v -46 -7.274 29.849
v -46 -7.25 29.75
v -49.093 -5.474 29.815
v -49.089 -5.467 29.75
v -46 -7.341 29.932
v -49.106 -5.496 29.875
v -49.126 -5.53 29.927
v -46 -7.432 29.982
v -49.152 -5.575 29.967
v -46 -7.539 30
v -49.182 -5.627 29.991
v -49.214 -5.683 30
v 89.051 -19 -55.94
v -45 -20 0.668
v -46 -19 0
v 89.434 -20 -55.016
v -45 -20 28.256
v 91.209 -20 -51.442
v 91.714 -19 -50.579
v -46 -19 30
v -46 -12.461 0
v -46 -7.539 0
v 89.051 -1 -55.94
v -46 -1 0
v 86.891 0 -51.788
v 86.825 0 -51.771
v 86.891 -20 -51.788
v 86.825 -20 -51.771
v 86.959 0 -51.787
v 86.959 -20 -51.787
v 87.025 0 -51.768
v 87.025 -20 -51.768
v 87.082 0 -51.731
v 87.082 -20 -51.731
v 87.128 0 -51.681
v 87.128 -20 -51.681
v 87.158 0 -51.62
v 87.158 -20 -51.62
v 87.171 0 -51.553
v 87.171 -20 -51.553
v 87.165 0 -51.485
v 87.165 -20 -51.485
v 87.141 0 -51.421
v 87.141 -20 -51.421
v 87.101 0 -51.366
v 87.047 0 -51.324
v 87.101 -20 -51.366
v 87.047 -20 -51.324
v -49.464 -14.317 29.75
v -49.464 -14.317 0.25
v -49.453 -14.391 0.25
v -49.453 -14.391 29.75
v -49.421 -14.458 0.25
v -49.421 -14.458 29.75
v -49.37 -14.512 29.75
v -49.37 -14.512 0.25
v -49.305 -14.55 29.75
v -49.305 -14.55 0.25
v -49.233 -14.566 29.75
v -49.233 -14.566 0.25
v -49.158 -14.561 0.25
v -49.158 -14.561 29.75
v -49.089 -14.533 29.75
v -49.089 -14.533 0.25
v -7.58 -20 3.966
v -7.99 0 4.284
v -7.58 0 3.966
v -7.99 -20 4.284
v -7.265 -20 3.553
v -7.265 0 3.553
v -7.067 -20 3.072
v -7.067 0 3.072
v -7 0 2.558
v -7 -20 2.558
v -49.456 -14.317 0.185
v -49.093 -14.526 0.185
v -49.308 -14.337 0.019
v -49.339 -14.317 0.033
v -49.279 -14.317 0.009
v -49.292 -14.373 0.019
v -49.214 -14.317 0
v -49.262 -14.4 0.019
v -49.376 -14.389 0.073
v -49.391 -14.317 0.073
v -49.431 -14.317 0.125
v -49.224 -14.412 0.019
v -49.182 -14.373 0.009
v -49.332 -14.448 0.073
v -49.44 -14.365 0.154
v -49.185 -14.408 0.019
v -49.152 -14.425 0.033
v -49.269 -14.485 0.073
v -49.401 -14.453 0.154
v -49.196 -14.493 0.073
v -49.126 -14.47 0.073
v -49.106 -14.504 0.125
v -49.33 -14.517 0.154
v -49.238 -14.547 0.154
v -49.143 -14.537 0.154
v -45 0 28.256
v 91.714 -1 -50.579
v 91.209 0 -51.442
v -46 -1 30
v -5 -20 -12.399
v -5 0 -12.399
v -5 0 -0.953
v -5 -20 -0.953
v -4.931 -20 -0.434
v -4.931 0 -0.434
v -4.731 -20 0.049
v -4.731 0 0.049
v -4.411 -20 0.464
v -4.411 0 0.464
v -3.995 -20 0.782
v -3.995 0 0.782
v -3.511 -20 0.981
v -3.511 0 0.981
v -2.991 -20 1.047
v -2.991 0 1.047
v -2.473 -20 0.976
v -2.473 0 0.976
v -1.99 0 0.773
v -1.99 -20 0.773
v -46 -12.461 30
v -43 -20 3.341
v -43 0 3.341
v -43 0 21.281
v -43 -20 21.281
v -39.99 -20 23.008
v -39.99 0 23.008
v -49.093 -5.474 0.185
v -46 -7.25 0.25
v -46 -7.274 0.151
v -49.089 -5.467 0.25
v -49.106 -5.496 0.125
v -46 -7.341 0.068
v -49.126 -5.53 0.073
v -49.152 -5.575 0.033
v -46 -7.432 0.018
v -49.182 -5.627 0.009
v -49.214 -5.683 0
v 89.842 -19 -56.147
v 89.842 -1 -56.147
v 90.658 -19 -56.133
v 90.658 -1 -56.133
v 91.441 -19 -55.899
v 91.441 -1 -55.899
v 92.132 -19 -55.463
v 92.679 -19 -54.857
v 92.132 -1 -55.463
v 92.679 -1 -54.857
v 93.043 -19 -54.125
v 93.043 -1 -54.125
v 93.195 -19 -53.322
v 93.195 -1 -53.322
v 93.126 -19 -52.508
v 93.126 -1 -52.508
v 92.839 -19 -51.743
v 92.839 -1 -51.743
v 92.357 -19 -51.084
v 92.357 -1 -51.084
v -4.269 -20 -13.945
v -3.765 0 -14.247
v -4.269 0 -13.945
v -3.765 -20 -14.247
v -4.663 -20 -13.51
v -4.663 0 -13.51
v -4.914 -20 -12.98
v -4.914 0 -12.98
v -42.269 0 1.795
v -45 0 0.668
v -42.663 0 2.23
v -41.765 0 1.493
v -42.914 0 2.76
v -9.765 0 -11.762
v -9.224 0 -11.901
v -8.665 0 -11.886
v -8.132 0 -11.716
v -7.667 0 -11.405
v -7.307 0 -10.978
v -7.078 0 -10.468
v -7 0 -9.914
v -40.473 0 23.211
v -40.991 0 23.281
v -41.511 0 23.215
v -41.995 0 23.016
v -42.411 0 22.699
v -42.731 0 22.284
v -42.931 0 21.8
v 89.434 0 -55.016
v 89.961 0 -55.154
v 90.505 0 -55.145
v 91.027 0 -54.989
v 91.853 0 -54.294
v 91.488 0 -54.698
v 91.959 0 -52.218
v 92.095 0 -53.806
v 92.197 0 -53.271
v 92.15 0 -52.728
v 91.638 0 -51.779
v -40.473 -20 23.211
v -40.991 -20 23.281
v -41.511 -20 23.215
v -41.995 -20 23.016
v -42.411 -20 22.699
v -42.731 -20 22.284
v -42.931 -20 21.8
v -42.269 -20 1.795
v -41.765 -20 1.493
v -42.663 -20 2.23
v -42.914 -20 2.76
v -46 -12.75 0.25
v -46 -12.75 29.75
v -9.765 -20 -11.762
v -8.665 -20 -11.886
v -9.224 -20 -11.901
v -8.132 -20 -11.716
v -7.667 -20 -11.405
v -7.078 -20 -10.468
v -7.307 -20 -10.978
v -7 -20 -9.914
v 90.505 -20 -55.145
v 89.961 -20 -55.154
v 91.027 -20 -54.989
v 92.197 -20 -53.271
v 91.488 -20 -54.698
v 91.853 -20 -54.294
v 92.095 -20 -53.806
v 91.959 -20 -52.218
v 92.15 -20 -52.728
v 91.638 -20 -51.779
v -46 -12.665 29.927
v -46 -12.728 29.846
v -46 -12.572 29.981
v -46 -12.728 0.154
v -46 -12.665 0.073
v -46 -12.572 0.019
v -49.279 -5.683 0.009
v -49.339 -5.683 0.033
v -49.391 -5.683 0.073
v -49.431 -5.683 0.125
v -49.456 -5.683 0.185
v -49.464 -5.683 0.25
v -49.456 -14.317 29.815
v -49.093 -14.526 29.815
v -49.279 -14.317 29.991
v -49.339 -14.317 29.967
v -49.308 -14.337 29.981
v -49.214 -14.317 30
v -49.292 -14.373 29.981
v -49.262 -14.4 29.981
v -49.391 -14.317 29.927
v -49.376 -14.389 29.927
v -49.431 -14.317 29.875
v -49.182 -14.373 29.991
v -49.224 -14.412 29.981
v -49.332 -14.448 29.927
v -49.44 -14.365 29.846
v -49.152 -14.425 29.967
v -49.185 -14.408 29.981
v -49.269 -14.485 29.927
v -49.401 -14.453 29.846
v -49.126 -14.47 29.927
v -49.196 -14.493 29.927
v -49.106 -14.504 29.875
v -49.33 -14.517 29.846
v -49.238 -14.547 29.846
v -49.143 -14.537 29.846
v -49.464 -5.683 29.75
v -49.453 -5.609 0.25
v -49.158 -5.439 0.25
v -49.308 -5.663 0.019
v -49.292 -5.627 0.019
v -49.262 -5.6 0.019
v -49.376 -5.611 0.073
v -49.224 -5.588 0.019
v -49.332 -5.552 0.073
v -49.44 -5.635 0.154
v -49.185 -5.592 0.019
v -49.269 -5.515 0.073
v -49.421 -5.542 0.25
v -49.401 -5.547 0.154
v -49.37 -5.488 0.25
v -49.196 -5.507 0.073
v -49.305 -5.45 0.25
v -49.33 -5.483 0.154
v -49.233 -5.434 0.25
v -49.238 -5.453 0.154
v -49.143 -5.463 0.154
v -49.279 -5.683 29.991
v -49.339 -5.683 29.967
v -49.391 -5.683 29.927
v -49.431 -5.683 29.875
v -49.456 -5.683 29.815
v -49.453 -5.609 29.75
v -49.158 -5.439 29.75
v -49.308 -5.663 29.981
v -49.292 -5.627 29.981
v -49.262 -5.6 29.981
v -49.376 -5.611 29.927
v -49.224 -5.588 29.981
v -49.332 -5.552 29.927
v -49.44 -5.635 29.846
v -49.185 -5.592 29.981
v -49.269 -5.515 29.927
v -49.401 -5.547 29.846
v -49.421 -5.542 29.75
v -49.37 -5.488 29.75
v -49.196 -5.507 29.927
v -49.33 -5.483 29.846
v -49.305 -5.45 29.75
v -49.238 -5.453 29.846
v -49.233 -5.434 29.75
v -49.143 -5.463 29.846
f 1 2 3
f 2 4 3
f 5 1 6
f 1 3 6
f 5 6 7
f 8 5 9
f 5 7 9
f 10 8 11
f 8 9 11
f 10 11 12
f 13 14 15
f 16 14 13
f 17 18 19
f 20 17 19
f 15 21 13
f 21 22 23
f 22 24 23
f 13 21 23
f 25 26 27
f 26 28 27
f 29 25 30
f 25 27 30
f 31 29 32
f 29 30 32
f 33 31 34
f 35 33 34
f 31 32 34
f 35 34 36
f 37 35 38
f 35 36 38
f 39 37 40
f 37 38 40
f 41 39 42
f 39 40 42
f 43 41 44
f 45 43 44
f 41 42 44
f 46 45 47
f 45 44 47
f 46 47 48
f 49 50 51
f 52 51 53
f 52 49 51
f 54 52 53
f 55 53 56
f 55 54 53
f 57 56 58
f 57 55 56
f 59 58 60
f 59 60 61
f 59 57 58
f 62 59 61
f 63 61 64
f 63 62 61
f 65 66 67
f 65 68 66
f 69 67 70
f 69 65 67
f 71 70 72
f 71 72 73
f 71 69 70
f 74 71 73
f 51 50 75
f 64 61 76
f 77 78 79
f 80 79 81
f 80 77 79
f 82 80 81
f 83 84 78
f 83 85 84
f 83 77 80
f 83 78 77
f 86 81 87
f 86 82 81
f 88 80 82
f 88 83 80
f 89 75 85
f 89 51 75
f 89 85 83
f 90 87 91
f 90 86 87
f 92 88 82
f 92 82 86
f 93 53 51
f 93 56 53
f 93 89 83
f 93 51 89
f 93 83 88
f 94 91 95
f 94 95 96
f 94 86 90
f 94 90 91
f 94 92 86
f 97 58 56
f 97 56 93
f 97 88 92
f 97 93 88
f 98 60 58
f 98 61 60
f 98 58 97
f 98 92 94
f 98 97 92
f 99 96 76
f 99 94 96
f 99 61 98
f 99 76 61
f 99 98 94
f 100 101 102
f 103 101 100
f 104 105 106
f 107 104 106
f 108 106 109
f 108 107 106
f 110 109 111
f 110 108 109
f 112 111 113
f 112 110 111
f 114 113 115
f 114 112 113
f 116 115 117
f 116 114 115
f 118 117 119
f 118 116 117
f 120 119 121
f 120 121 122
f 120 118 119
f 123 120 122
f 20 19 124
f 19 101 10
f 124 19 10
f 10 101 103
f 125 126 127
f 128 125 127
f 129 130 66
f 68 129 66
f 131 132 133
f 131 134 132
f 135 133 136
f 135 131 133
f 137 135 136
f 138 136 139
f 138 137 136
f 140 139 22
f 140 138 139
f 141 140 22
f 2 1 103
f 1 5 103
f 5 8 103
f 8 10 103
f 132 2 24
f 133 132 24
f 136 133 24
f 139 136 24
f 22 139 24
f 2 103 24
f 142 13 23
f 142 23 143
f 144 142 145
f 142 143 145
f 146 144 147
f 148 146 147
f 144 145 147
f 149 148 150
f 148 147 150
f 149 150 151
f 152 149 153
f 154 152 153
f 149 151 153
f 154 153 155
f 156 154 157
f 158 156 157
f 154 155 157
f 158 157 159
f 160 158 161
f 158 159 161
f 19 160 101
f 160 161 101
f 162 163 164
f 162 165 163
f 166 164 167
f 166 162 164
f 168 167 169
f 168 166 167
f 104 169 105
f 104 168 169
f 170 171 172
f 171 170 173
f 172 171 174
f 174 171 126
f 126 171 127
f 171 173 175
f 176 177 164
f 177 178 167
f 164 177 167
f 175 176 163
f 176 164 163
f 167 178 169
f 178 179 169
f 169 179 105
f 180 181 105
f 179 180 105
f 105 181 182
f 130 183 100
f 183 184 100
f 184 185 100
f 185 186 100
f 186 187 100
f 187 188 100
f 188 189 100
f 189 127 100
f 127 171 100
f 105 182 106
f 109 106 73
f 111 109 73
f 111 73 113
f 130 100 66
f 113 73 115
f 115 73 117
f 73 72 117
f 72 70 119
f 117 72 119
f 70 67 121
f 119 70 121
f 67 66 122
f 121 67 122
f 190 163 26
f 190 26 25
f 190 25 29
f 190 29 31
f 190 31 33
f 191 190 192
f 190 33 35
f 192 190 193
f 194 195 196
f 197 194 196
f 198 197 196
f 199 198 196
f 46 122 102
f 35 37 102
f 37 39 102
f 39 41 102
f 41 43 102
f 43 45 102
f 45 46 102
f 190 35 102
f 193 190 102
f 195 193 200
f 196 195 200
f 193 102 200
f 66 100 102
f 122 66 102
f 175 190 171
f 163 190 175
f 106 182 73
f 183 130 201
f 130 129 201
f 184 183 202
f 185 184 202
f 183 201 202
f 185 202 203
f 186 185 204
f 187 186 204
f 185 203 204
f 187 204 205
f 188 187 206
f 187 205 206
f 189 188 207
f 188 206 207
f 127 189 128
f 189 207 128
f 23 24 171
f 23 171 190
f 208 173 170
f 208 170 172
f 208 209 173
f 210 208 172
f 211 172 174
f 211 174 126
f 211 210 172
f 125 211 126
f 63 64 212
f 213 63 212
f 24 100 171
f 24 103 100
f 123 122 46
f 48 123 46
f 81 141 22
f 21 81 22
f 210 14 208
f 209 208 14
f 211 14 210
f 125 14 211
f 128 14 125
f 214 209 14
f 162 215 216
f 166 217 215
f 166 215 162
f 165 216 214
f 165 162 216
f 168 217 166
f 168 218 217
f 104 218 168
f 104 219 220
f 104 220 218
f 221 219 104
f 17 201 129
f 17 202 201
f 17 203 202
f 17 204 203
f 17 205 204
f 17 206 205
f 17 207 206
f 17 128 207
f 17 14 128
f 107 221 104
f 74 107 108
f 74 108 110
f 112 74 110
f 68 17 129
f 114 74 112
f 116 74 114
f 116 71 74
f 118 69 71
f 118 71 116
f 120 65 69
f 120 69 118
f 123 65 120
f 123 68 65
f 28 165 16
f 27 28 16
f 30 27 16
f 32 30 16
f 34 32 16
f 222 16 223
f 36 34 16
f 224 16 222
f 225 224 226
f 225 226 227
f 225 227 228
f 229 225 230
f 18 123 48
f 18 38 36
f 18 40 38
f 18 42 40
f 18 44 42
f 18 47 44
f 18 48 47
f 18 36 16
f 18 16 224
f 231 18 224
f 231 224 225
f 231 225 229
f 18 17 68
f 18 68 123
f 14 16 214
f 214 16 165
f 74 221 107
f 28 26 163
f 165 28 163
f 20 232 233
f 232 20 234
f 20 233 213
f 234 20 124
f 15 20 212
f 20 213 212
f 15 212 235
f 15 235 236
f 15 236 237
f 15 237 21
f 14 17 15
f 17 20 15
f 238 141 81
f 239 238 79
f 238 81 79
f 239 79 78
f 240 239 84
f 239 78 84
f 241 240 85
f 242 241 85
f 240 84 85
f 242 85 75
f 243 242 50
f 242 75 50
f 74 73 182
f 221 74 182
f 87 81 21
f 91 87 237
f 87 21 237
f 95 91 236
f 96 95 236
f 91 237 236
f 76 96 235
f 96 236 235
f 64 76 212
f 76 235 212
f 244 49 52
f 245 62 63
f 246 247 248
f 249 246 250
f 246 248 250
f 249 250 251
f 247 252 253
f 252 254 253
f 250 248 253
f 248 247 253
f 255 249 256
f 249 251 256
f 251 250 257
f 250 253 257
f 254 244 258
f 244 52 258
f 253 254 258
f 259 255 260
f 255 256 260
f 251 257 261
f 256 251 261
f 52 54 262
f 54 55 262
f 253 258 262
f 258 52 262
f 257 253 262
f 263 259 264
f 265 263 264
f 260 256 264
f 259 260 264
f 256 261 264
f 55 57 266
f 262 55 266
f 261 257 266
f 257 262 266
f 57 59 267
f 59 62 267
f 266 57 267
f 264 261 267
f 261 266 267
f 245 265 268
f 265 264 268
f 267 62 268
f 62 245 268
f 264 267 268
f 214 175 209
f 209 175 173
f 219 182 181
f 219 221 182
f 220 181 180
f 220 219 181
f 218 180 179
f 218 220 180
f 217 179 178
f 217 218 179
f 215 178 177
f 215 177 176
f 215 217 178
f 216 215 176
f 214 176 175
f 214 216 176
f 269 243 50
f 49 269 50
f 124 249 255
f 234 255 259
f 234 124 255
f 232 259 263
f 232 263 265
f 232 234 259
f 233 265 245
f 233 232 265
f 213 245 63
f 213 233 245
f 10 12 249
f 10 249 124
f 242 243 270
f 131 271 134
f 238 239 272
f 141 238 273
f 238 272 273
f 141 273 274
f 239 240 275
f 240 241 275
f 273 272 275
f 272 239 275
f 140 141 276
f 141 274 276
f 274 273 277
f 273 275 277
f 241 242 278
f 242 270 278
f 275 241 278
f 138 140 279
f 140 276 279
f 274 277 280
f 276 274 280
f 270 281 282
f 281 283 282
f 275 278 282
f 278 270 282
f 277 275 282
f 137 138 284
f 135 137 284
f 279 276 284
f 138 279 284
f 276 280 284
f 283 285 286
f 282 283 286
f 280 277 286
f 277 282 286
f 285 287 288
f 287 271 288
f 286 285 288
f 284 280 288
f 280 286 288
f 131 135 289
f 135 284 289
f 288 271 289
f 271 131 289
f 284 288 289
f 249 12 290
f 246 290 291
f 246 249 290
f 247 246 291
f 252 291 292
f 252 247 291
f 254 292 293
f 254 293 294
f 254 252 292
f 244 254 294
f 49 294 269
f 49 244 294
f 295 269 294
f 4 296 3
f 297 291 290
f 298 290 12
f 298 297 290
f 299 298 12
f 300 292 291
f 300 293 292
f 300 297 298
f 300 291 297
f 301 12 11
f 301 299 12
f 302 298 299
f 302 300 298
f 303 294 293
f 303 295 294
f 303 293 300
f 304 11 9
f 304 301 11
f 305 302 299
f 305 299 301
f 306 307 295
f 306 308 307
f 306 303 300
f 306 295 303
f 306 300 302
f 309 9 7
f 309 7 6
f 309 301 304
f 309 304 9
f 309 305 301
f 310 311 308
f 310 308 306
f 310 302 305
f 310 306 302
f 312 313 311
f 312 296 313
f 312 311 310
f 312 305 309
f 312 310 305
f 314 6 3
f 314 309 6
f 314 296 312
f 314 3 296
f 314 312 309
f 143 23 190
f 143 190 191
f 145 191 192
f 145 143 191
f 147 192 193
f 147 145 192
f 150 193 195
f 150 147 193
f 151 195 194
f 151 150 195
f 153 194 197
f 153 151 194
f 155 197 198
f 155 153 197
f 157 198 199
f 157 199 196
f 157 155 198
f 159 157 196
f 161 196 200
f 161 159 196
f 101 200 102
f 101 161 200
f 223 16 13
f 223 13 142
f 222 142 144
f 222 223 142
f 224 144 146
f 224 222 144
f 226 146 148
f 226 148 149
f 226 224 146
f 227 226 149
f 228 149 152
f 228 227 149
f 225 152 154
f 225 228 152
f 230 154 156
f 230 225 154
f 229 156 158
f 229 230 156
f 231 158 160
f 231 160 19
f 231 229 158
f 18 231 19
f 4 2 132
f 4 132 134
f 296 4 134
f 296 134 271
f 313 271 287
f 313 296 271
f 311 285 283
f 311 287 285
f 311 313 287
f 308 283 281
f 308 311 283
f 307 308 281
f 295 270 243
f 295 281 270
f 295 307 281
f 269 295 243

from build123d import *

# Parameters (mm, degrees)
F1_DEPTH = 20
F3_DEPTH = 30
F4_R     = 2
F5_SIZE  = 1
F6_R     = 0.25


with BuildPart() as f1:
    # F0 (on Front) → F1 (new body)
    with BuildSketch(Plane.XZ):
        with BuildLine():
            Line((-46, 30), (-46, 0))
            Line((-46, 0), (89.051266, -55.940066))
            ThreePointArc((89.051266, -55.940066), (92.886071, -54.503098), (91.714375, -50.579104))
            Line((91.714375, -50.579104), (-46, 30))
        make_face()
        Polygon((-5, 2.534367), (90.199316, -53.168427), (-5, -13.735579), (-7, -12.907152), (-43, 2.004536), (-43, 24.768836), (-7, 3.704603), align=None, mode=Mode.SUBTRACT)
        Polygon((-5, -13.735579), (-5, 2.534367), (-7, 3.704603), (-7, -12.907152), align=None)
    extrude(amount=F1_DEPTH)

    # F2 (on Top) → F3 (join)
    with BuildSketch(Plane.XY):
        Polygon((-49.464102, -14.75), (-46, -12.75), (-46, -7.25), (-49.464102, -5.25), align=None)
    extrude(amount=F3_DEPTH)

    # F4
    f4_edges = [f1.edges().sort_by_distance(p)[0] for p in [
        (-7, -10, -12.907152),
        (-43, -10, 2.004536),
        (-43, -10, 24.768836),
        (-7, -10, 3.704603),
        (-5, -10, 2.534367),
        (-5, -10, -13.735579),
    ]]
    fillet(f4_edges, radius=F4_R)

    # F5
    f5_edges = [f1.edges().sort_by_distance(p)[0] for p in [
        (-46, 0, 15),
        (-46, -20, 15),
        (21.525633, -20, -27.970033),
        (21.525633, 0, -27.970033),
    ]]
    chamfer(f5_edges, length=F5_SIZE)

    # F6
    f6_edges = [f1.edges().sort_by_distance(p)[0] for p in [
        (-49.464102, -14.75, 15),
        (-49.464102, -5.25, 15),
        (-49.464102, -10, 0),
        (-49.464102, -10, 30),
        (-47.732051, -13.75, 30),
        (-47.732051, -6.25, 30),
        (-47.732051, -6.25, 0),
        (-47.732051, -13.75, 0),
        (90.199316, -10, -53.168427),
    ]]
    fillet(f6_edges, radius=F6_R)


solid = f1.part
